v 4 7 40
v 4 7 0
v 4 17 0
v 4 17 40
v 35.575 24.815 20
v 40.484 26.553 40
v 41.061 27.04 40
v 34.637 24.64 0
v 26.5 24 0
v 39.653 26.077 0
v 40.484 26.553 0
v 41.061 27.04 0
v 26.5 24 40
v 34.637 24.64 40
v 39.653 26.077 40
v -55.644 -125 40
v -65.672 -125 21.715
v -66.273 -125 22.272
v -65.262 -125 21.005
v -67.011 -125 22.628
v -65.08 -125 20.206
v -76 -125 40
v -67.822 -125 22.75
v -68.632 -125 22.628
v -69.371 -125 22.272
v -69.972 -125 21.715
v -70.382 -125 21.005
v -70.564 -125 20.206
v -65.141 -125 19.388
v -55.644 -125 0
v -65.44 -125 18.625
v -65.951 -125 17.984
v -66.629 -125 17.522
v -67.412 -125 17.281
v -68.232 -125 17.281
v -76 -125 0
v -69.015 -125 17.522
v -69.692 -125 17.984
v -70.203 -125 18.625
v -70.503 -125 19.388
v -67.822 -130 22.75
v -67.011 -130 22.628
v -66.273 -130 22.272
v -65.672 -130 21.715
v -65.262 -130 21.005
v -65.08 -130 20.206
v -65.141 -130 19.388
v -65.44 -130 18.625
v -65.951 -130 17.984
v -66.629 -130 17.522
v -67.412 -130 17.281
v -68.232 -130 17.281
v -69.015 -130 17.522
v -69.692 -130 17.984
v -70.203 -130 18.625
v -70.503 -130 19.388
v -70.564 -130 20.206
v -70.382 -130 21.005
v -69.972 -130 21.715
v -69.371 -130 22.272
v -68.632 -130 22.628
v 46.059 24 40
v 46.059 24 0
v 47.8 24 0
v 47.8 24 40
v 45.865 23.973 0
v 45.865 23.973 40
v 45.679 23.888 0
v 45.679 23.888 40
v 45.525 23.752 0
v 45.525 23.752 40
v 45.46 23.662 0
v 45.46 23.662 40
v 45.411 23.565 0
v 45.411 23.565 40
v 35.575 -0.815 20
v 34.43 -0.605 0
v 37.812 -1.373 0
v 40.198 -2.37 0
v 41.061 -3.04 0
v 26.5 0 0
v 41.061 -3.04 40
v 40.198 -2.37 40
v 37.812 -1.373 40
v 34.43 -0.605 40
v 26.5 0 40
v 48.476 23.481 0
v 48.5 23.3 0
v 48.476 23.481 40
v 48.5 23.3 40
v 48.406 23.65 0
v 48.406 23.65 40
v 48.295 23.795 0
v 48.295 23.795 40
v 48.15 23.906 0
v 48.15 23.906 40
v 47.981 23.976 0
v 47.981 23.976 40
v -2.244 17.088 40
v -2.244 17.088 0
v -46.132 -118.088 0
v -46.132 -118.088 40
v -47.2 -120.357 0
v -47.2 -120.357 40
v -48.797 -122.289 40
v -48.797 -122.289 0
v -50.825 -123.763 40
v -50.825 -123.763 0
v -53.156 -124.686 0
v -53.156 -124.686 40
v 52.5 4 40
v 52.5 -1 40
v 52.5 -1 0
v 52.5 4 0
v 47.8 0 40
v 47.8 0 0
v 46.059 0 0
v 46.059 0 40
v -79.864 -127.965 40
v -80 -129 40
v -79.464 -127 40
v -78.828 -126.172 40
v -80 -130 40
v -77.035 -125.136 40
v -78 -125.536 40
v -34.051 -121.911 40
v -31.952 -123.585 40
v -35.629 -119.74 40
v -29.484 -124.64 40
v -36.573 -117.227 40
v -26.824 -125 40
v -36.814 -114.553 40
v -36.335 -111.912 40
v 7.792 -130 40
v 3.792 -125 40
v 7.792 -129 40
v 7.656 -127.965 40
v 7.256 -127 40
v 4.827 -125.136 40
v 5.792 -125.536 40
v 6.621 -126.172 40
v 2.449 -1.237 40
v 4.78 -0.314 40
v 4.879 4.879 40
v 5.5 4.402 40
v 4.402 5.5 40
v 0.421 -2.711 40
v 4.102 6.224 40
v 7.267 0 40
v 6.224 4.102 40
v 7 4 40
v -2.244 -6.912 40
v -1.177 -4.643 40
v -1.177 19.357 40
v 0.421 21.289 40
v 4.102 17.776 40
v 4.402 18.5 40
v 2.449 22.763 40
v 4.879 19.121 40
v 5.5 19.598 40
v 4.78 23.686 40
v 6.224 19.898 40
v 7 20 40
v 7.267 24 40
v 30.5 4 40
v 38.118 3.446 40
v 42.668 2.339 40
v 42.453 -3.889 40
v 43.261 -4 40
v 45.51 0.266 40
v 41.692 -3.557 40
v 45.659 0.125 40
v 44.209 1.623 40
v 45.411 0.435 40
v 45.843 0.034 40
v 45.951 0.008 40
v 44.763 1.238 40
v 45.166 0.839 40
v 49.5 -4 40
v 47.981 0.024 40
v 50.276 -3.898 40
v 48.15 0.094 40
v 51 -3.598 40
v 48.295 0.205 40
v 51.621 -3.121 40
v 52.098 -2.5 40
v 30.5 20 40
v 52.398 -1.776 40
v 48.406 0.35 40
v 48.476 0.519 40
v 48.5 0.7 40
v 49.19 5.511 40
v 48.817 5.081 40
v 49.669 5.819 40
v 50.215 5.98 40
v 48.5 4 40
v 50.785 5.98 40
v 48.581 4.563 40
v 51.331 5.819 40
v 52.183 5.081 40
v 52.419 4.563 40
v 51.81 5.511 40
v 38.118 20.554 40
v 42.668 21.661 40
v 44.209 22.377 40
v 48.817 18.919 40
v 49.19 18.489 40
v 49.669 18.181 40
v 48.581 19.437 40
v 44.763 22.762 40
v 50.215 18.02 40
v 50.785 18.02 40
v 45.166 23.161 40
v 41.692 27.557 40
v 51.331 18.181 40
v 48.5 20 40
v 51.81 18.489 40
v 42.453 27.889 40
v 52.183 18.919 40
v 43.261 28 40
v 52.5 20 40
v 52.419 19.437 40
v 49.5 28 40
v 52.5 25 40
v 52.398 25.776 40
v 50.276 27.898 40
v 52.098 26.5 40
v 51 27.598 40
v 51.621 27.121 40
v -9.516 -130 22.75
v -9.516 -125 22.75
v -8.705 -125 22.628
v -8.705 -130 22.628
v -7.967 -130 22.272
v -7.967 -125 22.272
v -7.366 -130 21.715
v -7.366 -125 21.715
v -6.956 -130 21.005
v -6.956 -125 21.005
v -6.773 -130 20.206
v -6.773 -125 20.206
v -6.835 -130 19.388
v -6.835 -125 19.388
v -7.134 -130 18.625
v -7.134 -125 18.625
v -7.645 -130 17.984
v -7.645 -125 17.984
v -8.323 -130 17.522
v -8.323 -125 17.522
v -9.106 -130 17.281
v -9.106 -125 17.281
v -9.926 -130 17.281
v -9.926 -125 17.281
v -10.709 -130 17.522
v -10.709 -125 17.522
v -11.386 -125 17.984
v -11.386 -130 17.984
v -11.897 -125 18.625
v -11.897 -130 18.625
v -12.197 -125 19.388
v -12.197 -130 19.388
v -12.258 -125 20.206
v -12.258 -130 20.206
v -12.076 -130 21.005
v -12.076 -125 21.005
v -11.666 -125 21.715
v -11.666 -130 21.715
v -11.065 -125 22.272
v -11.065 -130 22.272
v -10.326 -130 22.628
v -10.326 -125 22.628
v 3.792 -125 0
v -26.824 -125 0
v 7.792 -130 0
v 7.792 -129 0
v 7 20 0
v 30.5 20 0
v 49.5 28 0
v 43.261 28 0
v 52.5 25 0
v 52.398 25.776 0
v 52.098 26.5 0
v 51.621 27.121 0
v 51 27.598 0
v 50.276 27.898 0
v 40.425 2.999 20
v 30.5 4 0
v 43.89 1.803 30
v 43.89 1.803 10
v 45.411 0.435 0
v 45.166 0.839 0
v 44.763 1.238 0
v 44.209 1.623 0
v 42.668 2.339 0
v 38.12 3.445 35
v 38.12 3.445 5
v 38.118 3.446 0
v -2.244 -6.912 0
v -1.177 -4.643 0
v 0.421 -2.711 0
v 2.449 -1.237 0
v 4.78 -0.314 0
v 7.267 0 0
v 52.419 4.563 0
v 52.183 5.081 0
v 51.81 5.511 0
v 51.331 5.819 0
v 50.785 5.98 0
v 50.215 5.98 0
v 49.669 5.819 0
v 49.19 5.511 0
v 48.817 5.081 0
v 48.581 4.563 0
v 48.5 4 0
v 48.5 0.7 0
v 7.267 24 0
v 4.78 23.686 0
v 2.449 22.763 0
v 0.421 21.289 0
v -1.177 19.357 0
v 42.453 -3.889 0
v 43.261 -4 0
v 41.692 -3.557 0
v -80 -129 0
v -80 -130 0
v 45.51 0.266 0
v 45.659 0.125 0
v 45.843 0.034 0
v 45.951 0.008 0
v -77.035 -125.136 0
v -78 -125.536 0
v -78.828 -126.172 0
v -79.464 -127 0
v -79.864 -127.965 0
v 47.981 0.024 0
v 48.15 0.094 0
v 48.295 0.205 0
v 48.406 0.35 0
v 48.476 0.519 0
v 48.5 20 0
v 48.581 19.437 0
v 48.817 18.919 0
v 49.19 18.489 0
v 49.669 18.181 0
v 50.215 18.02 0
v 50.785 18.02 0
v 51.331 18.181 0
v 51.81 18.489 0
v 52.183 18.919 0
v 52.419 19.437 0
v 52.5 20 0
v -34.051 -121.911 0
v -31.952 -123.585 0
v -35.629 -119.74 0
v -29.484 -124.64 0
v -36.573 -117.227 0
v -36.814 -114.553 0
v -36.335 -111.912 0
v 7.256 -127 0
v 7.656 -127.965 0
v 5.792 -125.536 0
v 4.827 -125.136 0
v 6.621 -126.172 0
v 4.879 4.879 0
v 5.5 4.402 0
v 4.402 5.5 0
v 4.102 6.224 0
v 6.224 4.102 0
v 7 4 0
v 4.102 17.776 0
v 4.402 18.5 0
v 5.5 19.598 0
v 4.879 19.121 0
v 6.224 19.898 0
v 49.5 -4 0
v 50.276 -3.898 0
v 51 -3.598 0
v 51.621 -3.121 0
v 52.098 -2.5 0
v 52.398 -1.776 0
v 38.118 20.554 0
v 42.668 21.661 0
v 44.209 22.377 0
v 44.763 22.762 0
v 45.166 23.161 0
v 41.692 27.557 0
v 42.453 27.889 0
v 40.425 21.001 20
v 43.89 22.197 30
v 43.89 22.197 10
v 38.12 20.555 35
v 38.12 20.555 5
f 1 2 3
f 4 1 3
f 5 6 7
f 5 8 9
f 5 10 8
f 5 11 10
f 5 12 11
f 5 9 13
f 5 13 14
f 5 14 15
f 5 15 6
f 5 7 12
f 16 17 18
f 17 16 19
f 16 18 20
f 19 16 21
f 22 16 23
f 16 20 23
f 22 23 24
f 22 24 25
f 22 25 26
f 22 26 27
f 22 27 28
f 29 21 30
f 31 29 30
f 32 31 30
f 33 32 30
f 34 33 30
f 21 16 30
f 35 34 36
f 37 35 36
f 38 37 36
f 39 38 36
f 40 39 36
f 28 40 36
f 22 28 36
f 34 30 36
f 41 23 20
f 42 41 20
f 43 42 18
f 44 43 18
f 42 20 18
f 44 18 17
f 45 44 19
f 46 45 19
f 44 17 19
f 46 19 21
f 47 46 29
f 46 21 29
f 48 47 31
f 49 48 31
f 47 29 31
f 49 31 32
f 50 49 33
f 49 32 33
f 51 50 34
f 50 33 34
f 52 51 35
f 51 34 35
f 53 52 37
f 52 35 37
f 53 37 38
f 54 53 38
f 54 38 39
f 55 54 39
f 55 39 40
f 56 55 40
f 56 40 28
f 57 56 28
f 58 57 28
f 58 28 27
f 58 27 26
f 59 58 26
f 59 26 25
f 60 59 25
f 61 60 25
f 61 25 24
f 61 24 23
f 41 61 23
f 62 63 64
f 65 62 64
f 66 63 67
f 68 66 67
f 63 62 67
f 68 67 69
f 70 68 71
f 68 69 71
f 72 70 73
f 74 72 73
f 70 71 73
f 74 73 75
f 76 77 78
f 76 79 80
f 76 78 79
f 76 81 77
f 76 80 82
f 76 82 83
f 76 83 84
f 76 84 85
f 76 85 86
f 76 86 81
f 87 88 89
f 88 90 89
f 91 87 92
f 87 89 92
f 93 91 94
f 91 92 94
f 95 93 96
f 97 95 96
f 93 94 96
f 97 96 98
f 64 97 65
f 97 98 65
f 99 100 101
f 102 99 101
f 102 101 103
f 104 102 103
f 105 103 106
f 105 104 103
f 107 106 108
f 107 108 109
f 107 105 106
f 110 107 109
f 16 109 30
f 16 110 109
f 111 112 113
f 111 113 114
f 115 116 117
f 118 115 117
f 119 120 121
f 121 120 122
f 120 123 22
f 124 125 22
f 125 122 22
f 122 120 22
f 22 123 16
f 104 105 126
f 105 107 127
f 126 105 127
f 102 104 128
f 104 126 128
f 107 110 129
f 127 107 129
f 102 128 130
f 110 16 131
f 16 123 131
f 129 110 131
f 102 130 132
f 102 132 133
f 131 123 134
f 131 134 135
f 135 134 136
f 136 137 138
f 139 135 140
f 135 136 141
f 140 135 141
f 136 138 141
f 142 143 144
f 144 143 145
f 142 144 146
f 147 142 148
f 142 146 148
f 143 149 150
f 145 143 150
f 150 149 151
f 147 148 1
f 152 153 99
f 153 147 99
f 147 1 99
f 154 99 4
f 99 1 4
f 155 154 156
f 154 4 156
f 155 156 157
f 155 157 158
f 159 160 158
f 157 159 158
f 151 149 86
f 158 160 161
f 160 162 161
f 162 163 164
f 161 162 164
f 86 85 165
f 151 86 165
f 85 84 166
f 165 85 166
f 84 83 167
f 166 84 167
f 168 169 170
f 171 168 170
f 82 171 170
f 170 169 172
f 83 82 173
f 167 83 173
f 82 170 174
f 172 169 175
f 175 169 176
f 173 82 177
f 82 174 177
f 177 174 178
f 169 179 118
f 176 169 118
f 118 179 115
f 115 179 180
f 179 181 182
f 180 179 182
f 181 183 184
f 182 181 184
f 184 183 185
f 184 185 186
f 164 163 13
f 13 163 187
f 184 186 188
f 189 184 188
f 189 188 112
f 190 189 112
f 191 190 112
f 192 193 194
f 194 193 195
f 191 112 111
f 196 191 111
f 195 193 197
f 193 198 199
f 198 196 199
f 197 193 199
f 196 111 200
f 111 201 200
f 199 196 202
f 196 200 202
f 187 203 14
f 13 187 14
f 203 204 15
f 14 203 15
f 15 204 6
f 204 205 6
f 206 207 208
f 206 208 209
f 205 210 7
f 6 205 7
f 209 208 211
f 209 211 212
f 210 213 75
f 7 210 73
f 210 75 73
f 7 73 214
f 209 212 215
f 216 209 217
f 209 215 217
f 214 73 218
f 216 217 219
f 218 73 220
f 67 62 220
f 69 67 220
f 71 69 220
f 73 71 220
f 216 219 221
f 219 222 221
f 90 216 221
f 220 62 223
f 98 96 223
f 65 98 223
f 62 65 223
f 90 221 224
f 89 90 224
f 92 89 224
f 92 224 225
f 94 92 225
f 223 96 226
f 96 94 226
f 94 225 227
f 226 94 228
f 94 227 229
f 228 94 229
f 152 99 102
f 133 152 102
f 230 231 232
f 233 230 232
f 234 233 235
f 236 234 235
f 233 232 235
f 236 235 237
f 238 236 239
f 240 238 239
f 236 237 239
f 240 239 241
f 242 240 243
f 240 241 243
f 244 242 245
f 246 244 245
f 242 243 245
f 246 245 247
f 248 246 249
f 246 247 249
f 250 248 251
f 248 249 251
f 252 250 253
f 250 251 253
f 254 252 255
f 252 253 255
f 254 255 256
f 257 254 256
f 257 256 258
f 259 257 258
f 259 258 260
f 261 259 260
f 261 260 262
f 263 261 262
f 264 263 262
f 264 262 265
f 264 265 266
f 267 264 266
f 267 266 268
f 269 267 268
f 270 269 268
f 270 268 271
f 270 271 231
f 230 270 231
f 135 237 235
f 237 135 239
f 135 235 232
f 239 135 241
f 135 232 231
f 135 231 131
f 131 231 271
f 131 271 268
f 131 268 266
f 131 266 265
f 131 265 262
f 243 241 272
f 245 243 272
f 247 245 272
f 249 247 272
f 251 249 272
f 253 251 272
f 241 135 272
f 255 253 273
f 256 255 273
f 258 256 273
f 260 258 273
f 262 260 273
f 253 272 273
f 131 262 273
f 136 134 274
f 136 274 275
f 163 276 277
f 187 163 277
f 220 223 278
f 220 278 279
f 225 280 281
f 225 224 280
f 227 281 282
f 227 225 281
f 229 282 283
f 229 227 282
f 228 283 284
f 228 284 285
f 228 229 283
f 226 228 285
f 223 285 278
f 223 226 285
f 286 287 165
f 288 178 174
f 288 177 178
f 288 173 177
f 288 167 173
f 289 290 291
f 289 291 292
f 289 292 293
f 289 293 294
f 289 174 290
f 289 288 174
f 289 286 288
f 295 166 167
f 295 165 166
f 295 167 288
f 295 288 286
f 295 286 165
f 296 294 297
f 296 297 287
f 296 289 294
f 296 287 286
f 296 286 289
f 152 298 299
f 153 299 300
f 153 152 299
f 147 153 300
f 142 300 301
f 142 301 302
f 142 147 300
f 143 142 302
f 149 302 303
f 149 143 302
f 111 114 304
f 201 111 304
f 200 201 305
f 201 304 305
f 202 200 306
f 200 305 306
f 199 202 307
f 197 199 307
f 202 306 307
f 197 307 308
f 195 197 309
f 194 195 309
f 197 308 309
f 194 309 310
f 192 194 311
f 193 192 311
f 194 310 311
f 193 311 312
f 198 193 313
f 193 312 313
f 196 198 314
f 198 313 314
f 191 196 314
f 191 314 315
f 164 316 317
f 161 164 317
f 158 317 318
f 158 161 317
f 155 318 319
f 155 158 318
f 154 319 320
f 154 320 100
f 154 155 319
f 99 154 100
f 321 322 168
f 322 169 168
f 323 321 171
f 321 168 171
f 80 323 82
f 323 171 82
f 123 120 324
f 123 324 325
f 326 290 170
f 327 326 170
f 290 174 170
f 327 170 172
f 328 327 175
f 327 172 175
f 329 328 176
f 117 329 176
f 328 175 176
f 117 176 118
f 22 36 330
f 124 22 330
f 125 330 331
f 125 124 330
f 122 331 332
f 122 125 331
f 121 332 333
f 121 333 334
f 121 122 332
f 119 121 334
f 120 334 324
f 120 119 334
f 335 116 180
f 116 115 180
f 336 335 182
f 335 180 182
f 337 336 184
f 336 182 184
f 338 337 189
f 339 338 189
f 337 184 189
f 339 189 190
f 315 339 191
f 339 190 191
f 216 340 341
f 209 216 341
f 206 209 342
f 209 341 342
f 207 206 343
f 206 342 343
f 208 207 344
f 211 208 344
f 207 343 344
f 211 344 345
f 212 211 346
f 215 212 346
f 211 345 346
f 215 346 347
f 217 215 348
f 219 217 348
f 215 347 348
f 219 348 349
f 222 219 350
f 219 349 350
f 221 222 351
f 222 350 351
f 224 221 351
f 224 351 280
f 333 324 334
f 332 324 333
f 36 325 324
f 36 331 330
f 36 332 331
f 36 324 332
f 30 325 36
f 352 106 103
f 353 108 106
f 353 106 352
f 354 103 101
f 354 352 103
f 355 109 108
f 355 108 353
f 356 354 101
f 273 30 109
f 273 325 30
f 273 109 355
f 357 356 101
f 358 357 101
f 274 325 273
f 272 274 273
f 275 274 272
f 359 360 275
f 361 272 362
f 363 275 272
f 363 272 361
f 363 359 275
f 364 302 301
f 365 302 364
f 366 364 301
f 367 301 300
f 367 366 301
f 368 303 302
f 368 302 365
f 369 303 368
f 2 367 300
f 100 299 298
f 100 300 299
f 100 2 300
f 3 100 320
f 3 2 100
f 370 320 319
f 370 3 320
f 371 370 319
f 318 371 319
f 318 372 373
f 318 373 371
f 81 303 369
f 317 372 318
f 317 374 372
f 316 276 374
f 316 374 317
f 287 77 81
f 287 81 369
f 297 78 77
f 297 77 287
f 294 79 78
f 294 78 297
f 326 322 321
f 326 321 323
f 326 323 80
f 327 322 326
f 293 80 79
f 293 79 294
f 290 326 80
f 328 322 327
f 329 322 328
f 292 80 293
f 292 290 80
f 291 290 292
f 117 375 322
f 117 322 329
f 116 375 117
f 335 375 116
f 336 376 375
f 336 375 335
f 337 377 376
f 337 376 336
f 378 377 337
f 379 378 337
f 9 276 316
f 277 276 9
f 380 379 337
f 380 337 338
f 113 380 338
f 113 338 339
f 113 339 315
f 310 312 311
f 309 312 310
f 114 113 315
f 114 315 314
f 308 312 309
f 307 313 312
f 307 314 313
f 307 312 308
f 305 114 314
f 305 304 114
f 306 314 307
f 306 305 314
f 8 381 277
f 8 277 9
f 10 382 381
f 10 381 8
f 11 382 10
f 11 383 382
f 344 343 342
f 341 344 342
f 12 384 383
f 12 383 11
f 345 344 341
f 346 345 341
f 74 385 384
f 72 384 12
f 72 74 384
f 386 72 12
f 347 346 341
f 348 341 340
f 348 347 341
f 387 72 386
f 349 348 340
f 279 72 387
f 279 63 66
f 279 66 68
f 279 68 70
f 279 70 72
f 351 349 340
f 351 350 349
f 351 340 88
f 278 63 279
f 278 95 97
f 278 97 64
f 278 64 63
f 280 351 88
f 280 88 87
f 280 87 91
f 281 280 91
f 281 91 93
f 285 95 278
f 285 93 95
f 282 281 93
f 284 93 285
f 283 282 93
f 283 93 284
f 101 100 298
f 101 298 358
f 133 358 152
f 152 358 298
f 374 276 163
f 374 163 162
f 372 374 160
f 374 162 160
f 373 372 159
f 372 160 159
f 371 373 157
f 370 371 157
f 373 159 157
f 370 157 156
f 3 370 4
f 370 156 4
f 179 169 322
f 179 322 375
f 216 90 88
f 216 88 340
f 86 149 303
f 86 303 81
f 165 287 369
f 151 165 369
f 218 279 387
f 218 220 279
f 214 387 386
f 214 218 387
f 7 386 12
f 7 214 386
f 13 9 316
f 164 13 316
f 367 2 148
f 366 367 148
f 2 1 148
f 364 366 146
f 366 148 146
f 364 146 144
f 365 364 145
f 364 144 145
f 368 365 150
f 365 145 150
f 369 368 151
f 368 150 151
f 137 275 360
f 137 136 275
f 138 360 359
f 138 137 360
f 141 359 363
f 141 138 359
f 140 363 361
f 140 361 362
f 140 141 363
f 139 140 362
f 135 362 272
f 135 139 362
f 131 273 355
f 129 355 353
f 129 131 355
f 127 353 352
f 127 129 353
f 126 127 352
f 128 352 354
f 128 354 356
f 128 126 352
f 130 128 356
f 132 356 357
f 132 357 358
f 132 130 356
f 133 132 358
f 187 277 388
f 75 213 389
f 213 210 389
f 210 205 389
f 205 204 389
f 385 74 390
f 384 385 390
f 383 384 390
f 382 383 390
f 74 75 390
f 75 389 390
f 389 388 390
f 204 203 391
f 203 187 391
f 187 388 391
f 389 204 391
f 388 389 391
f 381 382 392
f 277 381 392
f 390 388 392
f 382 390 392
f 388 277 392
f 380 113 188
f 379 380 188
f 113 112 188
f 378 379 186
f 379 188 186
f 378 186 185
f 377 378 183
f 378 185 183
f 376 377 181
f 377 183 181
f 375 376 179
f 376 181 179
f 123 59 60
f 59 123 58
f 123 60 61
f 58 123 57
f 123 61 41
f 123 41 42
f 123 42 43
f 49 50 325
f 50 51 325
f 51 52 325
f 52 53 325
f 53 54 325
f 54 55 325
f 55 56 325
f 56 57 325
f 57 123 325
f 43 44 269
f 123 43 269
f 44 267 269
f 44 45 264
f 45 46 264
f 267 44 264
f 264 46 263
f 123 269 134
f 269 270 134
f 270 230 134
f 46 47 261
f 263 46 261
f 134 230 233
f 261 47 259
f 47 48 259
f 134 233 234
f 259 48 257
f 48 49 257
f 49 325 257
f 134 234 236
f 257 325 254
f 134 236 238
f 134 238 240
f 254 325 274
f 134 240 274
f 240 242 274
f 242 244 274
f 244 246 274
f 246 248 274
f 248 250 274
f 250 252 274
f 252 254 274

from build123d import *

# Parameters (mm, degrees)
BOSS_EXTRUDE1_DEPTH = 40
FILLET2_SIZE        = 15
FILLET2_SIZE_2      = 4
FILLET3_SIZE        = 15
FILLET3_SIZE_2      = 4
FILLET4_SIZE        = 15
FILLET4_SIZE_2      = 4
FILLET5_SIZE        = 4
FILLET5_SIZE_2      = 15
FILLET6_R           = 3
FILLET7_R           = 3
FILLET8_R           = 0.7
FILLET9_R           = 10
FILLET10_R          = 10
SKETCH2_R           = 2.75
CUT_EXTRUDE1_DEPTH  = 178.22584477
FILLET11_R          = 4


with BuildPart() as part:
    # Sketch1 → Boss-Extrude1 (new body)
    with BuildSketch(Plane.XY):
        with BuildLine():
            Line((41.5, 24), (0, 24))
            Line((0, 24), (-48.376623377, -125))
            Line((-48.376623377, -125), (-80, -125))
            Line((-80, -125), (-80, -130))
            Line((-80, -130), (7.792207792, -130))
            Line((7.792207792, -130), (7.792207792, -125))
            Line((7.792207792, -125), (-40.584415584, -125))
            Line((-40.584415584, -125), (0, 0))
            Line((0, 0), (41.5, 0))
            Line((41.5, 0), (41.5, -4))
            Line((41.5, -4), (52.5, -4))
            Line((52.5, -4), (52.5, 4))
            ThreePointArc((52.5, 4), (50.5, 6), (48.5, 4))
            Line((48.5, 4), (48.5, 0))
            Line((48.5, 0), (45.5, 0))
            Line((45.5, 0), (45.5, 4))
            Line((45.5, 4), (4, 4))
            Line((4, 4), (4, 20))
            Line((4, 20), (45.5, 20))
            Line((45.5, 20), (45.5, 24))
            Line((45.5, 24), (48.5, 24))
            Line((48.5, 24), (48.5, 20))
            ThreePointArc((48.5, 20), (50.5, 18), (52.5, 20))
            Line((52.5, 20), (52.5, 28))
            Line((52.5, 28), (41.5, 28))
            Line((41.5, 28), (41.5, 24))
        make_face()
    extrude(amount=BOSS_EXTRUDE1_DEPTH)

    # Fillet2
    # an asymmetric fillet: 15, 4 mm, written as the material it takes off along each edge
    with BuildSketch(Plane(origin=(45.5, 20, -37.5), x_dir=(-1, 0, 0), z_dir=(0, 0, 1))) as fillet2_piece_1:
        with BuildLine():
            Bezier((FILLET2_SIZE, 0), (0, 0), (0, -FILLET2_SIZE_2), weights=[1, 0.707106781, 1])
            Line((0, -FILLET2_SIZE_2), (0, 0))
            Line((0, 0), (FILLET2_SIZE, 0))
        make_face()
    extrude(amount=115, mode=Mode.SUBTRACT)

    # Fillet3
    # an asymmetric fillet: 15, 4 mm, written as the material it takes off along each edge
    with BuildSketch(Plane(origin=(45.5, 4, -37.5), x_dir=(-1, 0, 0), z_dir=(0, 0, 1))) as fillet3_piece_1:
        with BuildLine():
            Bezier((FILLET3_SIZE, 0), (0, 0), (0, FILLET3_SIZE_2), weights=[1, 0.707106781, 1])
            Line((0, FILLET3_SIZE_2), (0, 0))
            Line((0, 0), (FILLET3_SIZE, 0))
        make_face()
    extrude(amount=115, mode=Mode.SUBTRACT)

    # Fillet4
    # an asymmetric fillet: 15, 4 mm, written as the material it adds along each edge
    with BuildSketch(Plane(origin=(41.5, 24, 0), x_dir=(-1, 0, 0), z_dir=(0, 0, 1))) as fillet4_piece_1:
        with BuildLine():
            Bezier((FILLET4_SIZE, 0), (0, 0), (0, -FILLET4_SIZE_2), weights=[1, 0.707106781, 1])
            Line((0, -FILLET4_SIZE_2), (0, 0))
            Line((0, 0), (FILLET4_SIZE, 0))
        make_face()
    extrude(amount=40)

    # Fillet5
    # an asymmetric fillet: 15, 4 mm, written as the material it adds along each edge
    with BuildSketch(Plane(origin=(41.5, 0, 0), x_dir=(0, -1, 0), z_dir=(0, 0, 1))) as fillet5_piece_1:
        with BuildLine():
            Bezier((FILLET5_SIZE, 0), (0, 0), (0, -FILLET5_SIZE_2), weights=[1, 0.707106781, 1])
            Line((0, -FILLET5_SIZE_2), (0, 0))
            Line((0, 0), (FILLET5_SIZE, 0))
        make_face()
    extrude(amount=40)

    # Fillet6
    fillet6_edges = [part.edges().sort_by_distance(p)[0] for p in [
        (4, 4, 20),
        (4, 20, 20),
    ]]
    fillet(fillet6_edges, radius=FILLET6_R)

    # Fillet7
    fillet7_edges = [part.edges().sort_by_distance(p)[0] for p in [
        (52.5, -4, 20),
        (41.5, -4, 20),
        (41.5, 28, 20),
        (52.5, 28, 20),
    ]]
    fillet(fillet7_edges, radius=FILLET7_R)

    # Fillet8
    fillet8_edges = [part.edges().sort_by_distance(p)[0] for p in [
        (45.5, 0, 20),
        (48.5, 0, 20),
        (48.5, 24, 20),
        (45.5, 24, 20),
    ]]
    fillet(fillet8_edges, radius=FILLET8_R)

    # Fillet9
    fillet9_edges = [part.edges().sort_by_distance(p)[0] for p in [
        (0, 0, 20),
        (0, 24, 20),
    ]]
    fillet(fillet9_edges, radius=FILLET9_R)

    # Fillet10
    fillet10_edges = [part.edges().sort_by_distance(p)[0] for p in [
        (-48.376623377, -125, 20),
        (-40.584415584, -125, 20),
    ]]
    fillet(fillet10_edges, radius=FILLET10_R)

    # Sketch2 → Cut-Extrude1 (cut, through all)
    with BuildSketch(Plane(origin=(0, -125, 0), x_dir=(1, 0, 0), z_dir=(0, 1, 0))):
        with Locations(Location((-67.82186874, -20, 0), (0, 0, 270))):
            Circle(SKETCH2_R)
        with Locations(Location((-9.515793598, -20, 0), (0, 0, 270))):
            Circle(SKETCH2_R)
    extrude(amount=-CUT_EXTRUDE1_DEPTH, mode=Mode.SUBTRACT)

    # Fillet11
    fillet11_edges = [part.edges().sort_by_distance(p)[0] for p in [
        (7.792207792, -125, 20),
        (-80, -125, 20),
    ]]
    fillet(fillet11_edges, radius=FILLET11_R)


solid = part.part
